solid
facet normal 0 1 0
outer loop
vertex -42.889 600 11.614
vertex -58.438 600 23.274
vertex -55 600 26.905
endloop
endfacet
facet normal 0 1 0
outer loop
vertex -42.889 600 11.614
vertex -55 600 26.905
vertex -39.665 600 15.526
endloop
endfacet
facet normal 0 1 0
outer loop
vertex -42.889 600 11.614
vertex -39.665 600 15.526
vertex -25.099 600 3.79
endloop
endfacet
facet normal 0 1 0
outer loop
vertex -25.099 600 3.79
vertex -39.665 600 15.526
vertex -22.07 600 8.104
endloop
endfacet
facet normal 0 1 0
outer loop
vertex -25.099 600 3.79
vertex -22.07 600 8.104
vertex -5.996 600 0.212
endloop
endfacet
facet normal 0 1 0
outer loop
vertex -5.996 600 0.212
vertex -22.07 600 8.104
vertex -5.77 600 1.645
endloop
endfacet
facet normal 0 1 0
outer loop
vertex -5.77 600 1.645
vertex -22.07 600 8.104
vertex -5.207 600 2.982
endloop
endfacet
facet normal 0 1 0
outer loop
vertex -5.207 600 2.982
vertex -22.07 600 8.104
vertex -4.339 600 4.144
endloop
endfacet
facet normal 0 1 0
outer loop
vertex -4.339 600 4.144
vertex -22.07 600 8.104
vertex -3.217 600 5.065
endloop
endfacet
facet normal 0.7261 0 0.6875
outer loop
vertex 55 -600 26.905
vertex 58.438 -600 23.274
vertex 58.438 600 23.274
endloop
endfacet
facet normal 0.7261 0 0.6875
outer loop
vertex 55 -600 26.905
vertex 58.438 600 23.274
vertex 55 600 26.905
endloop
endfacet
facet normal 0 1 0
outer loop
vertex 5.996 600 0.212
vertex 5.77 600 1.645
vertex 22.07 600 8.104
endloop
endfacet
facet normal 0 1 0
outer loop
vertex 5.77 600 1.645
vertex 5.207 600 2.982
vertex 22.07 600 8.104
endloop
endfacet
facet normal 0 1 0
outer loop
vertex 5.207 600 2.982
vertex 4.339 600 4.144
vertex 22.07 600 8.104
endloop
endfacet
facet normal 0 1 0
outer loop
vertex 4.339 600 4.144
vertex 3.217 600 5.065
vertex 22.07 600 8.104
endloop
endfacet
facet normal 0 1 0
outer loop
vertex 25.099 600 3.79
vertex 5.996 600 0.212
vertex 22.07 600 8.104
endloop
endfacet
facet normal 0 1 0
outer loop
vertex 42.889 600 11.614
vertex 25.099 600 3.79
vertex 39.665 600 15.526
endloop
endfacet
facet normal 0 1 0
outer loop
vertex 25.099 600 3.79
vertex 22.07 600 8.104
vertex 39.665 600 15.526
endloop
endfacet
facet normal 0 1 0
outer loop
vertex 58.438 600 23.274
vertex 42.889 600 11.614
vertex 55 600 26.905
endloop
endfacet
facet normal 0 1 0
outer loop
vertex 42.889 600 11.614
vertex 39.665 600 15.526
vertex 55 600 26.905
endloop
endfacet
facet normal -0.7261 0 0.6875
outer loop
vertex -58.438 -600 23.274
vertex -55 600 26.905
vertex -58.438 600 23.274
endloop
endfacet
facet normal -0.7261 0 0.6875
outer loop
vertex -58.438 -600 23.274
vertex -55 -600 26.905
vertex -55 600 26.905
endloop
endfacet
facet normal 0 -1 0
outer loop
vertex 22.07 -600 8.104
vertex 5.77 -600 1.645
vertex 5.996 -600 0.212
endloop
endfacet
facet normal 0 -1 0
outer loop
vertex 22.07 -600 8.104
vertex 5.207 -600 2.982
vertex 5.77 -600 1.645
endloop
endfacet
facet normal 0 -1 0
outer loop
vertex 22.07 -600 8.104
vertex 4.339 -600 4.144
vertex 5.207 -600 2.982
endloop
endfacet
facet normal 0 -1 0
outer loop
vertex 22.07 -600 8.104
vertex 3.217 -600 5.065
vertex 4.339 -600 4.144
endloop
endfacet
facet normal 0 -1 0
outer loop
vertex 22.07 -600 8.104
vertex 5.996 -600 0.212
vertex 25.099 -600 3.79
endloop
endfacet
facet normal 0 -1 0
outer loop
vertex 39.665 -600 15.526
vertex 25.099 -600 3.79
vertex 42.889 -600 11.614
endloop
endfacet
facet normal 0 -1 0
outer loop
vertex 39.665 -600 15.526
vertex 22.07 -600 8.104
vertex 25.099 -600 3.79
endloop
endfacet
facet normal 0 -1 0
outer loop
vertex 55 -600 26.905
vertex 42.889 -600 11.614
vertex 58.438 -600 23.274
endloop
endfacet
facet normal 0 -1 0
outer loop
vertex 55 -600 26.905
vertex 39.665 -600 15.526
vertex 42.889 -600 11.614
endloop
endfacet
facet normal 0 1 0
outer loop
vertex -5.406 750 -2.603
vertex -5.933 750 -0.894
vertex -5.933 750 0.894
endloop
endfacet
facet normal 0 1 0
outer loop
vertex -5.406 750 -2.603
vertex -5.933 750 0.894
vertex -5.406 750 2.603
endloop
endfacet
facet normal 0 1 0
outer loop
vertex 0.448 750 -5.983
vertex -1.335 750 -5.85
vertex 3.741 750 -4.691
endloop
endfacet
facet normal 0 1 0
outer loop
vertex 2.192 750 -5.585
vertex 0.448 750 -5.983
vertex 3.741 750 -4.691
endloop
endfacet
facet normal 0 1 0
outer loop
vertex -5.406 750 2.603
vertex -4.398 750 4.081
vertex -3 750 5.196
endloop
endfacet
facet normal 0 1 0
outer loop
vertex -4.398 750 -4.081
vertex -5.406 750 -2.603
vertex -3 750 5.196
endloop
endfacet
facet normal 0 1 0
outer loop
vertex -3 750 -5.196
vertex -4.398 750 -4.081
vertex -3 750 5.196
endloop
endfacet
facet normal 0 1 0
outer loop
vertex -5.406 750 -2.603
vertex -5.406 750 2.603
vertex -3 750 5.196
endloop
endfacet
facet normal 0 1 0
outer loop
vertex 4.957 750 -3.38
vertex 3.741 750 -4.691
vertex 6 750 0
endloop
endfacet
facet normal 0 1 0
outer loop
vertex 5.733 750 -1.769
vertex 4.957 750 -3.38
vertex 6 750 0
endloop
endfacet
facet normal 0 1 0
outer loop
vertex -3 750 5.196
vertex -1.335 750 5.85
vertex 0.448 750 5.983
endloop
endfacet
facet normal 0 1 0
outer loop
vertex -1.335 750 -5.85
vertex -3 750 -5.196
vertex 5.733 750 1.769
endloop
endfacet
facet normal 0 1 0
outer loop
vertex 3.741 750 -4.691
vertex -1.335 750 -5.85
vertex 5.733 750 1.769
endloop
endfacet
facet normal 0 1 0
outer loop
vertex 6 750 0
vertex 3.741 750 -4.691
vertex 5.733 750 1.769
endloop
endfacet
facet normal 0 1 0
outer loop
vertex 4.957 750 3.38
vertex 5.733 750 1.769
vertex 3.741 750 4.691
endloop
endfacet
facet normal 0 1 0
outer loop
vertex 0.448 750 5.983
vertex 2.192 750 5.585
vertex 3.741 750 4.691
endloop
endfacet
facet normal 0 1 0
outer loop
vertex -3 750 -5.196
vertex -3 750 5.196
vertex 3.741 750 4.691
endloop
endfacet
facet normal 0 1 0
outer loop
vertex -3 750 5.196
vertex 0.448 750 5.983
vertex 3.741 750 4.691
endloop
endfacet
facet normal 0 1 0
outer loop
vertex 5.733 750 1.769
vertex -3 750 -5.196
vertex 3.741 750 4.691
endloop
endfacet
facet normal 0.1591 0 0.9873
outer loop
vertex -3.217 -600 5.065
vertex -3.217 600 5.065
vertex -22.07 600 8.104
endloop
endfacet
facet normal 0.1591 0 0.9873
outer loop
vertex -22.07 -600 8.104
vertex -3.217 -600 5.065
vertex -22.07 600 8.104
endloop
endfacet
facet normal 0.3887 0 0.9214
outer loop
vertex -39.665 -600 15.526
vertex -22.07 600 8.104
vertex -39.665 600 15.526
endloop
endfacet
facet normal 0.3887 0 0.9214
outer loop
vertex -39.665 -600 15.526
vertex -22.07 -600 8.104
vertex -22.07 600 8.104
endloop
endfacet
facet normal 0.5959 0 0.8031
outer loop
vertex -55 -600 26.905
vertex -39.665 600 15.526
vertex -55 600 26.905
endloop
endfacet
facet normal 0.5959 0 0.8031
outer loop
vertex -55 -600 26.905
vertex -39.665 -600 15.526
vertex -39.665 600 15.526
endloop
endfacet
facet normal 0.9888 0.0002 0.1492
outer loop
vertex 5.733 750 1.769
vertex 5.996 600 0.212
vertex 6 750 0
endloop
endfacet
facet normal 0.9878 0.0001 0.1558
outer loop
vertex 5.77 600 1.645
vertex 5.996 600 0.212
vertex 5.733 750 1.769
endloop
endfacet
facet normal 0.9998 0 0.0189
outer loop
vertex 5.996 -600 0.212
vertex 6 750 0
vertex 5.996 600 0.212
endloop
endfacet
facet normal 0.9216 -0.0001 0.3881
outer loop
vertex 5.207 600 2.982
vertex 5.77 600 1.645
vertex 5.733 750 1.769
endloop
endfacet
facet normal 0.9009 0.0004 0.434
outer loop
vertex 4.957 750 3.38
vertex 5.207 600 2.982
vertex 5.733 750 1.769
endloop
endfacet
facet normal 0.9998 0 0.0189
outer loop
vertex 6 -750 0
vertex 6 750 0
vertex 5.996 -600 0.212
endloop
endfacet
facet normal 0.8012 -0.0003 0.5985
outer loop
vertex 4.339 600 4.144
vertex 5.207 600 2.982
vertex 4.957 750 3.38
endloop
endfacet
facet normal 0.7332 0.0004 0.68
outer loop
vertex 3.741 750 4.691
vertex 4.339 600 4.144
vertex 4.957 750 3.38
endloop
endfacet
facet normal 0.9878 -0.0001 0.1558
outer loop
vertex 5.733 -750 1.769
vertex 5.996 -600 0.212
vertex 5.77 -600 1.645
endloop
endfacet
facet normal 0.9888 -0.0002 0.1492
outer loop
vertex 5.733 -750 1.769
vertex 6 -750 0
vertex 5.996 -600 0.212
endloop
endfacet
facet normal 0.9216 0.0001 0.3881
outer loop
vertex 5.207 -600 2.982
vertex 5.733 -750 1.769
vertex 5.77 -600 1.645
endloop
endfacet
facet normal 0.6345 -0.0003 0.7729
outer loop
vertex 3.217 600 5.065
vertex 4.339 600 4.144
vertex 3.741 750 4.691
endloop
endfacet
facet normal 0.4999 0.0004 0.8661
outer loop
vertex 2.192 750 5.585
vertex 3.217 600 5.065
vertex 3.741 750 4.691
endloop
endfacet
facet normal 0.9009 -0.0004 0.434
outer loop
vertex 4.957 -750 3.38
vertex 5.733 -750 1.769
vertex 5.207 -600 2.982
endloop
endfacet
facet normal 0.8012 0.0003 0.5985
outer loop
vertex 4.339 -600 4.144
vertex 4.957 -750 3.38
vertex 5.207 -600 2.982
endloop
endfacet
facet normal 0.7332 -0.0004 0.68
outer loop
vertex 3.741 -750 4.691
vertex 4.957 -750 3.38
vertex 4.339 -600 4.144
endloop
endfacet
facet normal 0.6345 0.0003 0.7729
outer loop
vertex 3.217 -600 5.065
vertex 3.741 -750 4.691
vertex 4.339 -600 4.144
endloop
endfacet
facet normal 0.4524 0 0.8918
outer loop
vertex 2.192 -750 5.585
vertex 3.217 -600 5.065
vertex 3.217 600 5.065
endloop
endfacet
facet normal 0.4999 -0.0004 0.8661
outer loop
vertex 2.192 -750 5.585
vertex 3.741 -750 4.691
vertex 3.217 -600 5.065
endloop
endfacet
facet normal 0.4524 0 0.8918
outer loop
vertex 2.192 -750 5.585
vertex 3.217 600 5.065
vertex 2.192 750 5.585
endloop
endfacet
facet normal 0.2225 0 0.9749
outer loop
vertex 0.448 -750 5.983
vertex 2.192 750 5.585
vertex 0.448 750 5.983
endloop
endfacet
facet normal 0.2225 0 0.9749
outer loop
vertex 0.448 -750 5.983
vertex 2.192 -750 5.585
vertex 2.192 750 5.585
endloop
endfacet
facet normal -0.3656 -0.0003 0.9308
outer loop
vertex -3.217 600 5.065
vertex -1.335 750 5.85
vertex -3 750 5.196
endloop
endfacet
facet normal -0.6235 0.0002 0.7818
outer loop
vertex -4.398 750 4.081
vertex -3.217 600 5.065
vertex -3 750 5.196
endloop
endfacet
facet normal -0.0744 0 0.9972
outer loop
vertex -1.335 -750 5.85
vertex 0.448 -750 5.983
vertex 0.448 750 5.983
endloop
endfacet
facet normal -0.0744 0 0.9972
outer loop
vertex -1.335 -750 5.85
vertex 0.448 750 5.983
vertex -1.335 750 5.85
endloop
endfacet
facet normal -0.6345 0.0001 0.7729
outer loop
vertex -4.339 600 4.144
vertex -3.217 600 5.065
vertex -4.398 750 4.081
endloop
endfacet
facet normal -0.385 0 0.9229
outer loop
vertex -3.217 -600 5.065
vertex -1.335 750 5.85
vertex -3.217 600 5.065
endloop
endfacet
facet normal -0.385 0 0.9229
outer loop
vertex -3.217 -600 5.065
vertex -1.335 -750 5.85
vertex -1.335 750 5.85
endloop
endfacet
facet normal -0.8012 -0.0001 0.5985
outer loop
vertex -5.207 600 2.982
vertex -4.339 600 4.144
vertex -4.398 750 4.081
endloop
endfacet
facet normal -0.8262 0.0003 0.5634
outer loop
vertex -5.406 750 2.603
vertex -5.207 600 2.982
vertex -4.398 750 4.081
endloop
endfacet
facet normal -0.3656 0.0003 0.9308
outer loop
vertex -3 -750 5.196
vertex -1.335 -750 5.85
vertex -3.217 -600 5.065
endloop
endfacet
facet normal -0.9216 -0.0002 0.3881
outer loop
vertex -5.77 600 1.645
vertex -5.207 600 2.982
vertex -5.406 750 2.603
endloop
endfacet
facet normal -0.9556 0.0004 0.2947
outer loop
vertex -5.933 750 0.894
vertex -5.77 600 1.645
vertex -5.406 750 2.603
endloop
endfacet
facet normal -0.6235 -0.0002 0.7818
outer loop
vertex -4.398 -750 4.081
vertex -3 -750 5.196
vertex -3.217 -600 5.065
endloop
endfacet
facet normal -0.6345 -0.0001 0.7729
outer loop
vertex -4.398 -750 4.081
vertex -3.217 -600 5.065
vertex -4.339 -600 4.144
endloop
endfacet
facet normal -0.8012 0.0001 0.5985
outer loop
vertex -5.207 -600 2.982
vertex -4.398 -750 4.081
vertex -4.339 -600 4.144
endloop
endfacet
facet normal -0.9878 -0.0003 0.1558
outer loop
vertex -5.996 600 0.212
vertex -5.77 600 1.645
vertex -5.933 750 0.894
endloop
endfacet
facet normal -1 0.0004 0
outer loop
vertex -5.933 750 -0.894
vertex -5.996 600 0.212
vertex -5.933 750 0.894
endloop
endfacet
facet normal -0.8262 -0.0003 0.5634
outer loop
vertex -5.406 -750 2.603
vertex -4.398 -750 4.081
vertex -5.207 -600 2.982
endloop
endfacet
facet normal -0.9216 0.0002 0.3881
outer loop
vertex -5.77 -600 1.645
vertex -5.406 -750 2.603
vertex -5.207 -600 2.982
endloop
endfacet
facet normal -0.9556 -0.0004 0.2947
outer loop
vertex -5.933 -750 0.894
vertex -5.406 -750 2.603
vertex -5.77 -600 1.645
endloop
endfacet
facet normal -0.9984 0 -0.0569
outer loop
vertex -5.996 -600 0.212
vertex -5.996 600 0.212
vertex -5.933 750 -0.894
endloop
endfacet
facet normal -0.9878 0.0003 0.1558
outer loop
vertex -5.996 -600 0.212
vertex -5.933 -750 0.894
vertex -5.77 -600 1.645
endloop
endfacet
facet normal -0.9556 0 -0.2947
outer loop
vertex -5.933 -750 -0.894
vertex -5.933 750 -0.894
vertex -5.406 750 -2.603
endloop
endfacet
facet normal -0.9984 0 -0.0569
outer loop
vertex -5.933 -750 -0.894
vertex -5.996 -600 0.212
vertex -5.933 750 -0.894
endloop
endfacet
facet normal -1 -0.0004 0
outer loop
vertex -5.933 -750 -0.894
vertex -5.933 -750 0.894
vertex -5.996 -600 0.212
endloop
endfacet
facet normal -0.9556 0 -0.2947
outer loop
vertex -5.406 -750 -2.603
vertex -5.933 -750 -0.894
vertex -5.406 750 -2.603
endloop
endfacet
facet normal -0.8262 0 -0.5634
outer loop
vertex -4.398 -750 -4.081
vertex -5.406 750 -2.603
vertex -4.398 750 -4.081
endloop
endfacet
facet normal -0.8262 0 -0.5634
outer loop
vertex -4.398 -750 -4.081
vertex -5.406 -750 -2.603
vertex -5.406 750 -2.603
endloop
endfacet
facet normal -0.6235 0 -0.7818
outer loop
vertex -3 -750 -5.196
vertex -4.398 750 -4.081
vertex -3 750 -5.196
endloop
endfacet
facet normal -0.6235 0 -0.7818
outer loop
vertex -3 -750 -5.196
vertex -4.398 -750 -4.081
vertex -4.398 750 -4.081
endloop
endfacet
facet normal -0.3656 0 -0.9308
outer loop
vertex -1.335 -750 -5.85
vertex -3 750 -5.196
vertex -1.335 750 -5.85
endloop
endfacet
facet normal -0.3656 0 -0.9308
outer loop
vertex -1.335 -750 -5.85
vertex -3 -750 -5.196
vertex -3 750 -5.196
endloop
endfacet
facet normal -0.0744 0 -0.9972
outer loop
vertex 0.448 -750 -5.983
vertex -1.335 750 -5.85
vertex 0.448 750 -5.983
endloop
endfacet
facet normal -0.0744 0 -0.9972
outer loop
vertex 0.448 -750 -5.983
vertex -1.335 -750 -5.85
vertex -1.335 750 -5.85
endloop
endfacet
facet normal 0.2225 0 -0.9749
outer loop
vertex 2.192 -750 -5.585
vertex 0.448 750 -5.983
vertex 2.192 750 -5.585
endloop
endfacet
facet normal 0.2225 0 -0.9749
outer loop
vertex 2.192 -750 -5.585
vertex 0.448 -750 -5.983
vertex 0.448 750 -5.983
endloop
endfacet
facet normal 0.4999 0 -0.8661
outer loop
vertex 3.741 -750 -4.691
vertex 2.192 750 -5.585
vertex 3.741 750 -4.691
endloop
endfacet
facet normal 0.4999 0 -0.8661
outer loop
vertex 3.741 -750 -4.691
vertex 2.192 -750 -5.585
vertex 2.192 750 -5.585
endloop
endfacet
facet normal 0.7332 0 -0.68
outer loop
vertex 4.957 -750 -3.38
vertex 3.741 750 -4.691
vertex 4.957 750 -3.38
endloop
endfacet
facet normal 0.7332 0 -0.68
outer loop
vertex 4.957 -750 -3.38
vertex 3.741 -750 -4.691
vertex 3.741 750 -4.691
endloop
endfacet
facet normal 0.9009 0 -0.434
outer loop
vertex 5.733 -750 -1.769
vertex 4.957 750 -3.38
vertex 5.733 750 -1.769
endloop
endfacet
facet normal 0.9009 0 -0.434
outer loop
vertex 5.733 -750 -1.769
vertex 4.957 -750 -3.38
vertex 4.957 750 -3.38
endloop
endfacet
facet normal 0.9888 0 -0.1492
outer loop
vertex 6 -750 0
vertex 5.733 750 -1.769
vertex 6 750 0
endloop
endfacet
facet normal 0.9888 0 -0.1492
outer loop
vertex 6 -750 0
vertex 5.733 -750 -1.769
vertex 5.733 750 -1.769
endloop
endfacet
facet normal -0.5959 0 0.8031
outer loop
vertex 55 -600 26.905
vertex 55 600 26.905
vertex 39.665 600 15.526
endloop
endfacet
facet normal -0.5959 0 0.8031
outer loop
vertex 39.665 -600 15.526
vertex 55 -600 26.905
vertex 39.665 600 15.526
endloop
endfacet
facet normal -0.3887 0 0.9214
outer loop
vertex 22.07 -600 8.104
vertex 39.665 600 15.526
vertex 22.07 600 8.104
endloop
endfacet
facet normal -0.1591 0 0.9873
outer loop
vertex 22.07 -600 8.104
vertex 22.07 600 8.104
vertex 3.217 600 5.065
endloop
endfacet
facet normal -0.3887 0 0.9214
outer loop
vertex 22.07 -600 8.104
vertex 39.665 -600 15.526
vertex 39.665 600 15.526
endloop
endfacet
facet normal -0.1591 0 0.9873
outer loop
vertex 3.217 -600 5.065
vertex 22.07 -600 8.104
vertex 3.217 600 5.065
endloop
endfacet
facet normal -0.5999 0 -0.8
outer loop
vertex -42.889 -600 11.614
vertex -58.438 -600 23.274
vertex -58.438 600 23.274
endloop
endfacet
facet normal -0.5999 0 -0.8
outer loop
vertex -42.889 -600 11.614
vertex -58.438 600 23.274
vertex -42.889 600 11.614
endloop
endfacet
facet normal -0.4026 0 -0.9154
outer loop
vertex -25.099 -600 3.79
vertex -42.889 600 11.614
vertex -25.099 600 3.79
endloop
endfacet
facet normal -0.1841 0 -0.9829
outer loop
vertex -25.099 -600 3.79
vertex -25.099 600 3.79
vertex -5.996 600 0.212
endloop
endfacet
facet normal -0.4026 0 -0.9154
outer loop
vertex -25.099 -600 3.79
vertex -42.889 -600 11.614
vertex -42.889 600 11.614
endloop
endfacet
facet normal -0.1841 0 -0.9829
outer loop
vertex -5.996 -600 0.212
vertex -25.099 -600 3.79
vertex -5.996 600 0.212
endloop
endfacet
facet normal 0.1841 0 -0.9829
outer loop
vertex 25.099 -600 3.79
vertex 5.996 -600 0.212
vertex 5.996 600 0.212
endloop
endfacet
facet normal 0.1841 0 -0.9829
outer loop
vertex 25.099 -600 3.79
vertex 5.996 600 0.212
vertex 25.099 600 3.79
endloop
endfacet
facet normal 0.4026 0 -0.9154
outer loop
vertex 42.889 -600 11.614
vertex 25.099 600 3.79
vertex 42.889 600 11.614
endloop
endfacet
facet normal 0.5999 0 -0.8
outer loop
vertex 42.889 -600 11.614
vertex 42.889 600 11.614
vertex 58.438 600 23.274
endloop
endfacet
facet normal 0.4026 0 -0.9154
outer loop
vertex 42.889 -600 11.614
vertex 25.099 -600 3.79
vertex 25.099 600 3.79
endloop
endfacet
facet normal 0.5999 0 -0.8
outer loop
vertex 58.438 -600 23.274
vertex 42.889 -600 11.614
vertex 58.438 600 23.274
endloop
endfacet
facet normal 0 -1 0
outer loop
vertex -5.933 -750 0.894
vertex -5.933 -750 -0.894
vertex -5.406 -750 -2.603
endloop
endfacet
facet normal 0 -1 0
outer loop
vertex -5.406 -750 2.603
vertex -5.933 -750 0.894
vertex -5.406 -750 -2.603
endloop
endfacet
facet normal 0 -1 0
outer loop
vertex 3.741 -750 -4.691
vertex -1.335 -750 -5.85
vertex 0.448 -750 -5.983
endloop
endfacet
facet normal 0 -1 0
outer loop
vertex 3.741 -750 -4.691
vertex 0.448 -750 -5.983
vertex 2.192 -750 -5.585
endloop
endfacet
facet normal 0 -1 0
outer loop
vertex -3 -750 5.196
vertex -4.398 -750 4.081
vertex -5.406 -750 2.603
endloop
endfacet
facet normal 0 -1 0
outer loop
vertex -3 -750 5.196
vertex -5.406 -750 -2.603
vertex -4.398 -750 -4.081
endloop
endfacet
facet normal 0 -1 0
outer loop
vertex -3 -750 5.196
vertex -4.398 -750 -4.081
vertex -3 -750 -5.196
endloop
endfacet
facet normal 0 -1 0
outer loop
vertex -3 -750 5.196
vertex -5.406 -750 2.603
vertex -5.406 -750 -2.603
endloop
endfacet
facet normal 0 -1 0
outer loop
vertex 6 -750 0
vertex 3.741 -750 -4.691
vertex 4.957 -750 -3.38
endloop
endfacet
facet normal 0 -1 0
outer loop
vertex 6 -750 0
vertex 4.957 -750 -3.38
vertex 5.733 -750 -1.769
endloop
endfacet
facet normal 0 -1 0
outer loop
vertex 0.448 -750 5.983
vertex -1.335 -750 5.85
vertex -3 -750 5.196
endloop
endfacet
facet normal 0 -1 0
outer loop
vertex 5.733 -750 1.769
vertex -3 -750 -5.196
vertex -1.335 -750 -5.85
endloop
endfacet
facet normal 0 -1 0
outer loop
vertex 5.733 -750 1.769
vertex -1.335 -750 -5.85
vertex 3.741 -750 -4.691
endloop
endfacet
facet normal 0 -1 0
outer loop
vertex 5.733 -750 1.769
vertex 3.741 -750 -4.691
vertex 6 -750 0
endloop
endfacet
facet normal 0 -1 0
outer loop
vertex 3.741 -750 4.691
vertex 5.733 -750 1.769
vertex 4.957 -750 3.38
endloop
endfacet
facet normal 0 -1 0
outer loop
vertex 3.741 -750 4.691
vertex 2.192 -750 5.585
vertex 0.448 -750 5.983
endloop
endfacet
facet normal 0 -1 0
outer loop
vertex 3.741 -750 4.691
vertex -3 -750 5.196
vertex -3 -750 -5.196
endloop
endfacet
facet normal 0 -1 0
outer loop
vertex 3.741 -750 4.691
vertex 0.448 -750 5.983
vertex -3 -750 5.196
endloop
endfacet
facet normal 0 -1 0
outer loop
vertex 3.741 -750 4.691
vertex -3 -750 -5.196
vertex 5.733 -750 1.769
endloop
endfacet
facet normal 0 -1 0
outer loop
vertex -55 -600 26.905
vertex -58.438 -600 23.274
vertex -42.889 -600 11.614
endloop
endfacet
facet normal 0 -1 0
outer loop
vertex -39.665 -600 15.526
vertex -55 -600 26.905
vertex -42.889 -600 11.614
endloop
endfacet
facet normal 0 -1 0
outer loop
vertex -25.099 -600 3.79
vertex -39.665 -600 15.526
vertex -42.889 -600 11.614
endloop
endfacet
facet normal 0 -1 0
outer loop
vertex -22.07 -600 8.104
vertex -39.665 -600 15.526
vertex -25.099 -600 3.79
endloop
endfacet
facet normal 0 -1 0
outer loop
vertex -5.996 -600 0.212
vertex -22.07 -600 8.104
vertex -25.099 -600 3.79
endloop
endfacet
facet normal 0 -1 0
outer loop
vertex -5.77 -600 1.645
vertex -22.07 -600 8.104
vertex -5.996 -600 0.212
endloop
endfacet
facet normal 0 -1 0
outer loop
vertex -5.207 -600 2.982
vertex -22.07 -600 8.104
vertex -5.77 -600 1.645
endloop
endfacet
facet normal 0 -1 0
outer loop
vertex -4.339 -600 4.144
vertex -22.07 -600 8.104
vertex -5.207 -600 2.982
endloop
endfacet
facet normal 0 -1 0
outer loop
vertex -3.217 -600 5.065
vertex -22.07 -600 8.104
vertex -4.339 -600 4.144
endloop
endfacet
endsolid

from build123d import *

# Parameters (mm, degrees)
F0_R     = 6
F1_DEPTH = 750
F3_DEPTH = 600


with BuildPart() as f1:
    # F0 (on Front) → F1 (new body, symmetric)
    with BuildSketch(Plane.XZ):
        Circle(F0_R)
    extrude(amount=F1_DEPTH, both=True)

    # F2 (on Front) → F3 (join, symmetric)
    with BuildSketch(Plane.XZ):
        with BuildLine():
            Line((-55, 26.90525), (-58.4375, 23.274328))
            ThreePointArc((-58.4375, 23.274328), (0, 0), (58.4375, 23.274328))
            Line((58.4375, 23.274328), (55, 26.90525))
            ThreePointArc((55, 26.90525), (0, 5), (-55, 26.90525))
        make_face()
    extrude(amount=F3_DEPTH, both=True)


solid = f1.part
